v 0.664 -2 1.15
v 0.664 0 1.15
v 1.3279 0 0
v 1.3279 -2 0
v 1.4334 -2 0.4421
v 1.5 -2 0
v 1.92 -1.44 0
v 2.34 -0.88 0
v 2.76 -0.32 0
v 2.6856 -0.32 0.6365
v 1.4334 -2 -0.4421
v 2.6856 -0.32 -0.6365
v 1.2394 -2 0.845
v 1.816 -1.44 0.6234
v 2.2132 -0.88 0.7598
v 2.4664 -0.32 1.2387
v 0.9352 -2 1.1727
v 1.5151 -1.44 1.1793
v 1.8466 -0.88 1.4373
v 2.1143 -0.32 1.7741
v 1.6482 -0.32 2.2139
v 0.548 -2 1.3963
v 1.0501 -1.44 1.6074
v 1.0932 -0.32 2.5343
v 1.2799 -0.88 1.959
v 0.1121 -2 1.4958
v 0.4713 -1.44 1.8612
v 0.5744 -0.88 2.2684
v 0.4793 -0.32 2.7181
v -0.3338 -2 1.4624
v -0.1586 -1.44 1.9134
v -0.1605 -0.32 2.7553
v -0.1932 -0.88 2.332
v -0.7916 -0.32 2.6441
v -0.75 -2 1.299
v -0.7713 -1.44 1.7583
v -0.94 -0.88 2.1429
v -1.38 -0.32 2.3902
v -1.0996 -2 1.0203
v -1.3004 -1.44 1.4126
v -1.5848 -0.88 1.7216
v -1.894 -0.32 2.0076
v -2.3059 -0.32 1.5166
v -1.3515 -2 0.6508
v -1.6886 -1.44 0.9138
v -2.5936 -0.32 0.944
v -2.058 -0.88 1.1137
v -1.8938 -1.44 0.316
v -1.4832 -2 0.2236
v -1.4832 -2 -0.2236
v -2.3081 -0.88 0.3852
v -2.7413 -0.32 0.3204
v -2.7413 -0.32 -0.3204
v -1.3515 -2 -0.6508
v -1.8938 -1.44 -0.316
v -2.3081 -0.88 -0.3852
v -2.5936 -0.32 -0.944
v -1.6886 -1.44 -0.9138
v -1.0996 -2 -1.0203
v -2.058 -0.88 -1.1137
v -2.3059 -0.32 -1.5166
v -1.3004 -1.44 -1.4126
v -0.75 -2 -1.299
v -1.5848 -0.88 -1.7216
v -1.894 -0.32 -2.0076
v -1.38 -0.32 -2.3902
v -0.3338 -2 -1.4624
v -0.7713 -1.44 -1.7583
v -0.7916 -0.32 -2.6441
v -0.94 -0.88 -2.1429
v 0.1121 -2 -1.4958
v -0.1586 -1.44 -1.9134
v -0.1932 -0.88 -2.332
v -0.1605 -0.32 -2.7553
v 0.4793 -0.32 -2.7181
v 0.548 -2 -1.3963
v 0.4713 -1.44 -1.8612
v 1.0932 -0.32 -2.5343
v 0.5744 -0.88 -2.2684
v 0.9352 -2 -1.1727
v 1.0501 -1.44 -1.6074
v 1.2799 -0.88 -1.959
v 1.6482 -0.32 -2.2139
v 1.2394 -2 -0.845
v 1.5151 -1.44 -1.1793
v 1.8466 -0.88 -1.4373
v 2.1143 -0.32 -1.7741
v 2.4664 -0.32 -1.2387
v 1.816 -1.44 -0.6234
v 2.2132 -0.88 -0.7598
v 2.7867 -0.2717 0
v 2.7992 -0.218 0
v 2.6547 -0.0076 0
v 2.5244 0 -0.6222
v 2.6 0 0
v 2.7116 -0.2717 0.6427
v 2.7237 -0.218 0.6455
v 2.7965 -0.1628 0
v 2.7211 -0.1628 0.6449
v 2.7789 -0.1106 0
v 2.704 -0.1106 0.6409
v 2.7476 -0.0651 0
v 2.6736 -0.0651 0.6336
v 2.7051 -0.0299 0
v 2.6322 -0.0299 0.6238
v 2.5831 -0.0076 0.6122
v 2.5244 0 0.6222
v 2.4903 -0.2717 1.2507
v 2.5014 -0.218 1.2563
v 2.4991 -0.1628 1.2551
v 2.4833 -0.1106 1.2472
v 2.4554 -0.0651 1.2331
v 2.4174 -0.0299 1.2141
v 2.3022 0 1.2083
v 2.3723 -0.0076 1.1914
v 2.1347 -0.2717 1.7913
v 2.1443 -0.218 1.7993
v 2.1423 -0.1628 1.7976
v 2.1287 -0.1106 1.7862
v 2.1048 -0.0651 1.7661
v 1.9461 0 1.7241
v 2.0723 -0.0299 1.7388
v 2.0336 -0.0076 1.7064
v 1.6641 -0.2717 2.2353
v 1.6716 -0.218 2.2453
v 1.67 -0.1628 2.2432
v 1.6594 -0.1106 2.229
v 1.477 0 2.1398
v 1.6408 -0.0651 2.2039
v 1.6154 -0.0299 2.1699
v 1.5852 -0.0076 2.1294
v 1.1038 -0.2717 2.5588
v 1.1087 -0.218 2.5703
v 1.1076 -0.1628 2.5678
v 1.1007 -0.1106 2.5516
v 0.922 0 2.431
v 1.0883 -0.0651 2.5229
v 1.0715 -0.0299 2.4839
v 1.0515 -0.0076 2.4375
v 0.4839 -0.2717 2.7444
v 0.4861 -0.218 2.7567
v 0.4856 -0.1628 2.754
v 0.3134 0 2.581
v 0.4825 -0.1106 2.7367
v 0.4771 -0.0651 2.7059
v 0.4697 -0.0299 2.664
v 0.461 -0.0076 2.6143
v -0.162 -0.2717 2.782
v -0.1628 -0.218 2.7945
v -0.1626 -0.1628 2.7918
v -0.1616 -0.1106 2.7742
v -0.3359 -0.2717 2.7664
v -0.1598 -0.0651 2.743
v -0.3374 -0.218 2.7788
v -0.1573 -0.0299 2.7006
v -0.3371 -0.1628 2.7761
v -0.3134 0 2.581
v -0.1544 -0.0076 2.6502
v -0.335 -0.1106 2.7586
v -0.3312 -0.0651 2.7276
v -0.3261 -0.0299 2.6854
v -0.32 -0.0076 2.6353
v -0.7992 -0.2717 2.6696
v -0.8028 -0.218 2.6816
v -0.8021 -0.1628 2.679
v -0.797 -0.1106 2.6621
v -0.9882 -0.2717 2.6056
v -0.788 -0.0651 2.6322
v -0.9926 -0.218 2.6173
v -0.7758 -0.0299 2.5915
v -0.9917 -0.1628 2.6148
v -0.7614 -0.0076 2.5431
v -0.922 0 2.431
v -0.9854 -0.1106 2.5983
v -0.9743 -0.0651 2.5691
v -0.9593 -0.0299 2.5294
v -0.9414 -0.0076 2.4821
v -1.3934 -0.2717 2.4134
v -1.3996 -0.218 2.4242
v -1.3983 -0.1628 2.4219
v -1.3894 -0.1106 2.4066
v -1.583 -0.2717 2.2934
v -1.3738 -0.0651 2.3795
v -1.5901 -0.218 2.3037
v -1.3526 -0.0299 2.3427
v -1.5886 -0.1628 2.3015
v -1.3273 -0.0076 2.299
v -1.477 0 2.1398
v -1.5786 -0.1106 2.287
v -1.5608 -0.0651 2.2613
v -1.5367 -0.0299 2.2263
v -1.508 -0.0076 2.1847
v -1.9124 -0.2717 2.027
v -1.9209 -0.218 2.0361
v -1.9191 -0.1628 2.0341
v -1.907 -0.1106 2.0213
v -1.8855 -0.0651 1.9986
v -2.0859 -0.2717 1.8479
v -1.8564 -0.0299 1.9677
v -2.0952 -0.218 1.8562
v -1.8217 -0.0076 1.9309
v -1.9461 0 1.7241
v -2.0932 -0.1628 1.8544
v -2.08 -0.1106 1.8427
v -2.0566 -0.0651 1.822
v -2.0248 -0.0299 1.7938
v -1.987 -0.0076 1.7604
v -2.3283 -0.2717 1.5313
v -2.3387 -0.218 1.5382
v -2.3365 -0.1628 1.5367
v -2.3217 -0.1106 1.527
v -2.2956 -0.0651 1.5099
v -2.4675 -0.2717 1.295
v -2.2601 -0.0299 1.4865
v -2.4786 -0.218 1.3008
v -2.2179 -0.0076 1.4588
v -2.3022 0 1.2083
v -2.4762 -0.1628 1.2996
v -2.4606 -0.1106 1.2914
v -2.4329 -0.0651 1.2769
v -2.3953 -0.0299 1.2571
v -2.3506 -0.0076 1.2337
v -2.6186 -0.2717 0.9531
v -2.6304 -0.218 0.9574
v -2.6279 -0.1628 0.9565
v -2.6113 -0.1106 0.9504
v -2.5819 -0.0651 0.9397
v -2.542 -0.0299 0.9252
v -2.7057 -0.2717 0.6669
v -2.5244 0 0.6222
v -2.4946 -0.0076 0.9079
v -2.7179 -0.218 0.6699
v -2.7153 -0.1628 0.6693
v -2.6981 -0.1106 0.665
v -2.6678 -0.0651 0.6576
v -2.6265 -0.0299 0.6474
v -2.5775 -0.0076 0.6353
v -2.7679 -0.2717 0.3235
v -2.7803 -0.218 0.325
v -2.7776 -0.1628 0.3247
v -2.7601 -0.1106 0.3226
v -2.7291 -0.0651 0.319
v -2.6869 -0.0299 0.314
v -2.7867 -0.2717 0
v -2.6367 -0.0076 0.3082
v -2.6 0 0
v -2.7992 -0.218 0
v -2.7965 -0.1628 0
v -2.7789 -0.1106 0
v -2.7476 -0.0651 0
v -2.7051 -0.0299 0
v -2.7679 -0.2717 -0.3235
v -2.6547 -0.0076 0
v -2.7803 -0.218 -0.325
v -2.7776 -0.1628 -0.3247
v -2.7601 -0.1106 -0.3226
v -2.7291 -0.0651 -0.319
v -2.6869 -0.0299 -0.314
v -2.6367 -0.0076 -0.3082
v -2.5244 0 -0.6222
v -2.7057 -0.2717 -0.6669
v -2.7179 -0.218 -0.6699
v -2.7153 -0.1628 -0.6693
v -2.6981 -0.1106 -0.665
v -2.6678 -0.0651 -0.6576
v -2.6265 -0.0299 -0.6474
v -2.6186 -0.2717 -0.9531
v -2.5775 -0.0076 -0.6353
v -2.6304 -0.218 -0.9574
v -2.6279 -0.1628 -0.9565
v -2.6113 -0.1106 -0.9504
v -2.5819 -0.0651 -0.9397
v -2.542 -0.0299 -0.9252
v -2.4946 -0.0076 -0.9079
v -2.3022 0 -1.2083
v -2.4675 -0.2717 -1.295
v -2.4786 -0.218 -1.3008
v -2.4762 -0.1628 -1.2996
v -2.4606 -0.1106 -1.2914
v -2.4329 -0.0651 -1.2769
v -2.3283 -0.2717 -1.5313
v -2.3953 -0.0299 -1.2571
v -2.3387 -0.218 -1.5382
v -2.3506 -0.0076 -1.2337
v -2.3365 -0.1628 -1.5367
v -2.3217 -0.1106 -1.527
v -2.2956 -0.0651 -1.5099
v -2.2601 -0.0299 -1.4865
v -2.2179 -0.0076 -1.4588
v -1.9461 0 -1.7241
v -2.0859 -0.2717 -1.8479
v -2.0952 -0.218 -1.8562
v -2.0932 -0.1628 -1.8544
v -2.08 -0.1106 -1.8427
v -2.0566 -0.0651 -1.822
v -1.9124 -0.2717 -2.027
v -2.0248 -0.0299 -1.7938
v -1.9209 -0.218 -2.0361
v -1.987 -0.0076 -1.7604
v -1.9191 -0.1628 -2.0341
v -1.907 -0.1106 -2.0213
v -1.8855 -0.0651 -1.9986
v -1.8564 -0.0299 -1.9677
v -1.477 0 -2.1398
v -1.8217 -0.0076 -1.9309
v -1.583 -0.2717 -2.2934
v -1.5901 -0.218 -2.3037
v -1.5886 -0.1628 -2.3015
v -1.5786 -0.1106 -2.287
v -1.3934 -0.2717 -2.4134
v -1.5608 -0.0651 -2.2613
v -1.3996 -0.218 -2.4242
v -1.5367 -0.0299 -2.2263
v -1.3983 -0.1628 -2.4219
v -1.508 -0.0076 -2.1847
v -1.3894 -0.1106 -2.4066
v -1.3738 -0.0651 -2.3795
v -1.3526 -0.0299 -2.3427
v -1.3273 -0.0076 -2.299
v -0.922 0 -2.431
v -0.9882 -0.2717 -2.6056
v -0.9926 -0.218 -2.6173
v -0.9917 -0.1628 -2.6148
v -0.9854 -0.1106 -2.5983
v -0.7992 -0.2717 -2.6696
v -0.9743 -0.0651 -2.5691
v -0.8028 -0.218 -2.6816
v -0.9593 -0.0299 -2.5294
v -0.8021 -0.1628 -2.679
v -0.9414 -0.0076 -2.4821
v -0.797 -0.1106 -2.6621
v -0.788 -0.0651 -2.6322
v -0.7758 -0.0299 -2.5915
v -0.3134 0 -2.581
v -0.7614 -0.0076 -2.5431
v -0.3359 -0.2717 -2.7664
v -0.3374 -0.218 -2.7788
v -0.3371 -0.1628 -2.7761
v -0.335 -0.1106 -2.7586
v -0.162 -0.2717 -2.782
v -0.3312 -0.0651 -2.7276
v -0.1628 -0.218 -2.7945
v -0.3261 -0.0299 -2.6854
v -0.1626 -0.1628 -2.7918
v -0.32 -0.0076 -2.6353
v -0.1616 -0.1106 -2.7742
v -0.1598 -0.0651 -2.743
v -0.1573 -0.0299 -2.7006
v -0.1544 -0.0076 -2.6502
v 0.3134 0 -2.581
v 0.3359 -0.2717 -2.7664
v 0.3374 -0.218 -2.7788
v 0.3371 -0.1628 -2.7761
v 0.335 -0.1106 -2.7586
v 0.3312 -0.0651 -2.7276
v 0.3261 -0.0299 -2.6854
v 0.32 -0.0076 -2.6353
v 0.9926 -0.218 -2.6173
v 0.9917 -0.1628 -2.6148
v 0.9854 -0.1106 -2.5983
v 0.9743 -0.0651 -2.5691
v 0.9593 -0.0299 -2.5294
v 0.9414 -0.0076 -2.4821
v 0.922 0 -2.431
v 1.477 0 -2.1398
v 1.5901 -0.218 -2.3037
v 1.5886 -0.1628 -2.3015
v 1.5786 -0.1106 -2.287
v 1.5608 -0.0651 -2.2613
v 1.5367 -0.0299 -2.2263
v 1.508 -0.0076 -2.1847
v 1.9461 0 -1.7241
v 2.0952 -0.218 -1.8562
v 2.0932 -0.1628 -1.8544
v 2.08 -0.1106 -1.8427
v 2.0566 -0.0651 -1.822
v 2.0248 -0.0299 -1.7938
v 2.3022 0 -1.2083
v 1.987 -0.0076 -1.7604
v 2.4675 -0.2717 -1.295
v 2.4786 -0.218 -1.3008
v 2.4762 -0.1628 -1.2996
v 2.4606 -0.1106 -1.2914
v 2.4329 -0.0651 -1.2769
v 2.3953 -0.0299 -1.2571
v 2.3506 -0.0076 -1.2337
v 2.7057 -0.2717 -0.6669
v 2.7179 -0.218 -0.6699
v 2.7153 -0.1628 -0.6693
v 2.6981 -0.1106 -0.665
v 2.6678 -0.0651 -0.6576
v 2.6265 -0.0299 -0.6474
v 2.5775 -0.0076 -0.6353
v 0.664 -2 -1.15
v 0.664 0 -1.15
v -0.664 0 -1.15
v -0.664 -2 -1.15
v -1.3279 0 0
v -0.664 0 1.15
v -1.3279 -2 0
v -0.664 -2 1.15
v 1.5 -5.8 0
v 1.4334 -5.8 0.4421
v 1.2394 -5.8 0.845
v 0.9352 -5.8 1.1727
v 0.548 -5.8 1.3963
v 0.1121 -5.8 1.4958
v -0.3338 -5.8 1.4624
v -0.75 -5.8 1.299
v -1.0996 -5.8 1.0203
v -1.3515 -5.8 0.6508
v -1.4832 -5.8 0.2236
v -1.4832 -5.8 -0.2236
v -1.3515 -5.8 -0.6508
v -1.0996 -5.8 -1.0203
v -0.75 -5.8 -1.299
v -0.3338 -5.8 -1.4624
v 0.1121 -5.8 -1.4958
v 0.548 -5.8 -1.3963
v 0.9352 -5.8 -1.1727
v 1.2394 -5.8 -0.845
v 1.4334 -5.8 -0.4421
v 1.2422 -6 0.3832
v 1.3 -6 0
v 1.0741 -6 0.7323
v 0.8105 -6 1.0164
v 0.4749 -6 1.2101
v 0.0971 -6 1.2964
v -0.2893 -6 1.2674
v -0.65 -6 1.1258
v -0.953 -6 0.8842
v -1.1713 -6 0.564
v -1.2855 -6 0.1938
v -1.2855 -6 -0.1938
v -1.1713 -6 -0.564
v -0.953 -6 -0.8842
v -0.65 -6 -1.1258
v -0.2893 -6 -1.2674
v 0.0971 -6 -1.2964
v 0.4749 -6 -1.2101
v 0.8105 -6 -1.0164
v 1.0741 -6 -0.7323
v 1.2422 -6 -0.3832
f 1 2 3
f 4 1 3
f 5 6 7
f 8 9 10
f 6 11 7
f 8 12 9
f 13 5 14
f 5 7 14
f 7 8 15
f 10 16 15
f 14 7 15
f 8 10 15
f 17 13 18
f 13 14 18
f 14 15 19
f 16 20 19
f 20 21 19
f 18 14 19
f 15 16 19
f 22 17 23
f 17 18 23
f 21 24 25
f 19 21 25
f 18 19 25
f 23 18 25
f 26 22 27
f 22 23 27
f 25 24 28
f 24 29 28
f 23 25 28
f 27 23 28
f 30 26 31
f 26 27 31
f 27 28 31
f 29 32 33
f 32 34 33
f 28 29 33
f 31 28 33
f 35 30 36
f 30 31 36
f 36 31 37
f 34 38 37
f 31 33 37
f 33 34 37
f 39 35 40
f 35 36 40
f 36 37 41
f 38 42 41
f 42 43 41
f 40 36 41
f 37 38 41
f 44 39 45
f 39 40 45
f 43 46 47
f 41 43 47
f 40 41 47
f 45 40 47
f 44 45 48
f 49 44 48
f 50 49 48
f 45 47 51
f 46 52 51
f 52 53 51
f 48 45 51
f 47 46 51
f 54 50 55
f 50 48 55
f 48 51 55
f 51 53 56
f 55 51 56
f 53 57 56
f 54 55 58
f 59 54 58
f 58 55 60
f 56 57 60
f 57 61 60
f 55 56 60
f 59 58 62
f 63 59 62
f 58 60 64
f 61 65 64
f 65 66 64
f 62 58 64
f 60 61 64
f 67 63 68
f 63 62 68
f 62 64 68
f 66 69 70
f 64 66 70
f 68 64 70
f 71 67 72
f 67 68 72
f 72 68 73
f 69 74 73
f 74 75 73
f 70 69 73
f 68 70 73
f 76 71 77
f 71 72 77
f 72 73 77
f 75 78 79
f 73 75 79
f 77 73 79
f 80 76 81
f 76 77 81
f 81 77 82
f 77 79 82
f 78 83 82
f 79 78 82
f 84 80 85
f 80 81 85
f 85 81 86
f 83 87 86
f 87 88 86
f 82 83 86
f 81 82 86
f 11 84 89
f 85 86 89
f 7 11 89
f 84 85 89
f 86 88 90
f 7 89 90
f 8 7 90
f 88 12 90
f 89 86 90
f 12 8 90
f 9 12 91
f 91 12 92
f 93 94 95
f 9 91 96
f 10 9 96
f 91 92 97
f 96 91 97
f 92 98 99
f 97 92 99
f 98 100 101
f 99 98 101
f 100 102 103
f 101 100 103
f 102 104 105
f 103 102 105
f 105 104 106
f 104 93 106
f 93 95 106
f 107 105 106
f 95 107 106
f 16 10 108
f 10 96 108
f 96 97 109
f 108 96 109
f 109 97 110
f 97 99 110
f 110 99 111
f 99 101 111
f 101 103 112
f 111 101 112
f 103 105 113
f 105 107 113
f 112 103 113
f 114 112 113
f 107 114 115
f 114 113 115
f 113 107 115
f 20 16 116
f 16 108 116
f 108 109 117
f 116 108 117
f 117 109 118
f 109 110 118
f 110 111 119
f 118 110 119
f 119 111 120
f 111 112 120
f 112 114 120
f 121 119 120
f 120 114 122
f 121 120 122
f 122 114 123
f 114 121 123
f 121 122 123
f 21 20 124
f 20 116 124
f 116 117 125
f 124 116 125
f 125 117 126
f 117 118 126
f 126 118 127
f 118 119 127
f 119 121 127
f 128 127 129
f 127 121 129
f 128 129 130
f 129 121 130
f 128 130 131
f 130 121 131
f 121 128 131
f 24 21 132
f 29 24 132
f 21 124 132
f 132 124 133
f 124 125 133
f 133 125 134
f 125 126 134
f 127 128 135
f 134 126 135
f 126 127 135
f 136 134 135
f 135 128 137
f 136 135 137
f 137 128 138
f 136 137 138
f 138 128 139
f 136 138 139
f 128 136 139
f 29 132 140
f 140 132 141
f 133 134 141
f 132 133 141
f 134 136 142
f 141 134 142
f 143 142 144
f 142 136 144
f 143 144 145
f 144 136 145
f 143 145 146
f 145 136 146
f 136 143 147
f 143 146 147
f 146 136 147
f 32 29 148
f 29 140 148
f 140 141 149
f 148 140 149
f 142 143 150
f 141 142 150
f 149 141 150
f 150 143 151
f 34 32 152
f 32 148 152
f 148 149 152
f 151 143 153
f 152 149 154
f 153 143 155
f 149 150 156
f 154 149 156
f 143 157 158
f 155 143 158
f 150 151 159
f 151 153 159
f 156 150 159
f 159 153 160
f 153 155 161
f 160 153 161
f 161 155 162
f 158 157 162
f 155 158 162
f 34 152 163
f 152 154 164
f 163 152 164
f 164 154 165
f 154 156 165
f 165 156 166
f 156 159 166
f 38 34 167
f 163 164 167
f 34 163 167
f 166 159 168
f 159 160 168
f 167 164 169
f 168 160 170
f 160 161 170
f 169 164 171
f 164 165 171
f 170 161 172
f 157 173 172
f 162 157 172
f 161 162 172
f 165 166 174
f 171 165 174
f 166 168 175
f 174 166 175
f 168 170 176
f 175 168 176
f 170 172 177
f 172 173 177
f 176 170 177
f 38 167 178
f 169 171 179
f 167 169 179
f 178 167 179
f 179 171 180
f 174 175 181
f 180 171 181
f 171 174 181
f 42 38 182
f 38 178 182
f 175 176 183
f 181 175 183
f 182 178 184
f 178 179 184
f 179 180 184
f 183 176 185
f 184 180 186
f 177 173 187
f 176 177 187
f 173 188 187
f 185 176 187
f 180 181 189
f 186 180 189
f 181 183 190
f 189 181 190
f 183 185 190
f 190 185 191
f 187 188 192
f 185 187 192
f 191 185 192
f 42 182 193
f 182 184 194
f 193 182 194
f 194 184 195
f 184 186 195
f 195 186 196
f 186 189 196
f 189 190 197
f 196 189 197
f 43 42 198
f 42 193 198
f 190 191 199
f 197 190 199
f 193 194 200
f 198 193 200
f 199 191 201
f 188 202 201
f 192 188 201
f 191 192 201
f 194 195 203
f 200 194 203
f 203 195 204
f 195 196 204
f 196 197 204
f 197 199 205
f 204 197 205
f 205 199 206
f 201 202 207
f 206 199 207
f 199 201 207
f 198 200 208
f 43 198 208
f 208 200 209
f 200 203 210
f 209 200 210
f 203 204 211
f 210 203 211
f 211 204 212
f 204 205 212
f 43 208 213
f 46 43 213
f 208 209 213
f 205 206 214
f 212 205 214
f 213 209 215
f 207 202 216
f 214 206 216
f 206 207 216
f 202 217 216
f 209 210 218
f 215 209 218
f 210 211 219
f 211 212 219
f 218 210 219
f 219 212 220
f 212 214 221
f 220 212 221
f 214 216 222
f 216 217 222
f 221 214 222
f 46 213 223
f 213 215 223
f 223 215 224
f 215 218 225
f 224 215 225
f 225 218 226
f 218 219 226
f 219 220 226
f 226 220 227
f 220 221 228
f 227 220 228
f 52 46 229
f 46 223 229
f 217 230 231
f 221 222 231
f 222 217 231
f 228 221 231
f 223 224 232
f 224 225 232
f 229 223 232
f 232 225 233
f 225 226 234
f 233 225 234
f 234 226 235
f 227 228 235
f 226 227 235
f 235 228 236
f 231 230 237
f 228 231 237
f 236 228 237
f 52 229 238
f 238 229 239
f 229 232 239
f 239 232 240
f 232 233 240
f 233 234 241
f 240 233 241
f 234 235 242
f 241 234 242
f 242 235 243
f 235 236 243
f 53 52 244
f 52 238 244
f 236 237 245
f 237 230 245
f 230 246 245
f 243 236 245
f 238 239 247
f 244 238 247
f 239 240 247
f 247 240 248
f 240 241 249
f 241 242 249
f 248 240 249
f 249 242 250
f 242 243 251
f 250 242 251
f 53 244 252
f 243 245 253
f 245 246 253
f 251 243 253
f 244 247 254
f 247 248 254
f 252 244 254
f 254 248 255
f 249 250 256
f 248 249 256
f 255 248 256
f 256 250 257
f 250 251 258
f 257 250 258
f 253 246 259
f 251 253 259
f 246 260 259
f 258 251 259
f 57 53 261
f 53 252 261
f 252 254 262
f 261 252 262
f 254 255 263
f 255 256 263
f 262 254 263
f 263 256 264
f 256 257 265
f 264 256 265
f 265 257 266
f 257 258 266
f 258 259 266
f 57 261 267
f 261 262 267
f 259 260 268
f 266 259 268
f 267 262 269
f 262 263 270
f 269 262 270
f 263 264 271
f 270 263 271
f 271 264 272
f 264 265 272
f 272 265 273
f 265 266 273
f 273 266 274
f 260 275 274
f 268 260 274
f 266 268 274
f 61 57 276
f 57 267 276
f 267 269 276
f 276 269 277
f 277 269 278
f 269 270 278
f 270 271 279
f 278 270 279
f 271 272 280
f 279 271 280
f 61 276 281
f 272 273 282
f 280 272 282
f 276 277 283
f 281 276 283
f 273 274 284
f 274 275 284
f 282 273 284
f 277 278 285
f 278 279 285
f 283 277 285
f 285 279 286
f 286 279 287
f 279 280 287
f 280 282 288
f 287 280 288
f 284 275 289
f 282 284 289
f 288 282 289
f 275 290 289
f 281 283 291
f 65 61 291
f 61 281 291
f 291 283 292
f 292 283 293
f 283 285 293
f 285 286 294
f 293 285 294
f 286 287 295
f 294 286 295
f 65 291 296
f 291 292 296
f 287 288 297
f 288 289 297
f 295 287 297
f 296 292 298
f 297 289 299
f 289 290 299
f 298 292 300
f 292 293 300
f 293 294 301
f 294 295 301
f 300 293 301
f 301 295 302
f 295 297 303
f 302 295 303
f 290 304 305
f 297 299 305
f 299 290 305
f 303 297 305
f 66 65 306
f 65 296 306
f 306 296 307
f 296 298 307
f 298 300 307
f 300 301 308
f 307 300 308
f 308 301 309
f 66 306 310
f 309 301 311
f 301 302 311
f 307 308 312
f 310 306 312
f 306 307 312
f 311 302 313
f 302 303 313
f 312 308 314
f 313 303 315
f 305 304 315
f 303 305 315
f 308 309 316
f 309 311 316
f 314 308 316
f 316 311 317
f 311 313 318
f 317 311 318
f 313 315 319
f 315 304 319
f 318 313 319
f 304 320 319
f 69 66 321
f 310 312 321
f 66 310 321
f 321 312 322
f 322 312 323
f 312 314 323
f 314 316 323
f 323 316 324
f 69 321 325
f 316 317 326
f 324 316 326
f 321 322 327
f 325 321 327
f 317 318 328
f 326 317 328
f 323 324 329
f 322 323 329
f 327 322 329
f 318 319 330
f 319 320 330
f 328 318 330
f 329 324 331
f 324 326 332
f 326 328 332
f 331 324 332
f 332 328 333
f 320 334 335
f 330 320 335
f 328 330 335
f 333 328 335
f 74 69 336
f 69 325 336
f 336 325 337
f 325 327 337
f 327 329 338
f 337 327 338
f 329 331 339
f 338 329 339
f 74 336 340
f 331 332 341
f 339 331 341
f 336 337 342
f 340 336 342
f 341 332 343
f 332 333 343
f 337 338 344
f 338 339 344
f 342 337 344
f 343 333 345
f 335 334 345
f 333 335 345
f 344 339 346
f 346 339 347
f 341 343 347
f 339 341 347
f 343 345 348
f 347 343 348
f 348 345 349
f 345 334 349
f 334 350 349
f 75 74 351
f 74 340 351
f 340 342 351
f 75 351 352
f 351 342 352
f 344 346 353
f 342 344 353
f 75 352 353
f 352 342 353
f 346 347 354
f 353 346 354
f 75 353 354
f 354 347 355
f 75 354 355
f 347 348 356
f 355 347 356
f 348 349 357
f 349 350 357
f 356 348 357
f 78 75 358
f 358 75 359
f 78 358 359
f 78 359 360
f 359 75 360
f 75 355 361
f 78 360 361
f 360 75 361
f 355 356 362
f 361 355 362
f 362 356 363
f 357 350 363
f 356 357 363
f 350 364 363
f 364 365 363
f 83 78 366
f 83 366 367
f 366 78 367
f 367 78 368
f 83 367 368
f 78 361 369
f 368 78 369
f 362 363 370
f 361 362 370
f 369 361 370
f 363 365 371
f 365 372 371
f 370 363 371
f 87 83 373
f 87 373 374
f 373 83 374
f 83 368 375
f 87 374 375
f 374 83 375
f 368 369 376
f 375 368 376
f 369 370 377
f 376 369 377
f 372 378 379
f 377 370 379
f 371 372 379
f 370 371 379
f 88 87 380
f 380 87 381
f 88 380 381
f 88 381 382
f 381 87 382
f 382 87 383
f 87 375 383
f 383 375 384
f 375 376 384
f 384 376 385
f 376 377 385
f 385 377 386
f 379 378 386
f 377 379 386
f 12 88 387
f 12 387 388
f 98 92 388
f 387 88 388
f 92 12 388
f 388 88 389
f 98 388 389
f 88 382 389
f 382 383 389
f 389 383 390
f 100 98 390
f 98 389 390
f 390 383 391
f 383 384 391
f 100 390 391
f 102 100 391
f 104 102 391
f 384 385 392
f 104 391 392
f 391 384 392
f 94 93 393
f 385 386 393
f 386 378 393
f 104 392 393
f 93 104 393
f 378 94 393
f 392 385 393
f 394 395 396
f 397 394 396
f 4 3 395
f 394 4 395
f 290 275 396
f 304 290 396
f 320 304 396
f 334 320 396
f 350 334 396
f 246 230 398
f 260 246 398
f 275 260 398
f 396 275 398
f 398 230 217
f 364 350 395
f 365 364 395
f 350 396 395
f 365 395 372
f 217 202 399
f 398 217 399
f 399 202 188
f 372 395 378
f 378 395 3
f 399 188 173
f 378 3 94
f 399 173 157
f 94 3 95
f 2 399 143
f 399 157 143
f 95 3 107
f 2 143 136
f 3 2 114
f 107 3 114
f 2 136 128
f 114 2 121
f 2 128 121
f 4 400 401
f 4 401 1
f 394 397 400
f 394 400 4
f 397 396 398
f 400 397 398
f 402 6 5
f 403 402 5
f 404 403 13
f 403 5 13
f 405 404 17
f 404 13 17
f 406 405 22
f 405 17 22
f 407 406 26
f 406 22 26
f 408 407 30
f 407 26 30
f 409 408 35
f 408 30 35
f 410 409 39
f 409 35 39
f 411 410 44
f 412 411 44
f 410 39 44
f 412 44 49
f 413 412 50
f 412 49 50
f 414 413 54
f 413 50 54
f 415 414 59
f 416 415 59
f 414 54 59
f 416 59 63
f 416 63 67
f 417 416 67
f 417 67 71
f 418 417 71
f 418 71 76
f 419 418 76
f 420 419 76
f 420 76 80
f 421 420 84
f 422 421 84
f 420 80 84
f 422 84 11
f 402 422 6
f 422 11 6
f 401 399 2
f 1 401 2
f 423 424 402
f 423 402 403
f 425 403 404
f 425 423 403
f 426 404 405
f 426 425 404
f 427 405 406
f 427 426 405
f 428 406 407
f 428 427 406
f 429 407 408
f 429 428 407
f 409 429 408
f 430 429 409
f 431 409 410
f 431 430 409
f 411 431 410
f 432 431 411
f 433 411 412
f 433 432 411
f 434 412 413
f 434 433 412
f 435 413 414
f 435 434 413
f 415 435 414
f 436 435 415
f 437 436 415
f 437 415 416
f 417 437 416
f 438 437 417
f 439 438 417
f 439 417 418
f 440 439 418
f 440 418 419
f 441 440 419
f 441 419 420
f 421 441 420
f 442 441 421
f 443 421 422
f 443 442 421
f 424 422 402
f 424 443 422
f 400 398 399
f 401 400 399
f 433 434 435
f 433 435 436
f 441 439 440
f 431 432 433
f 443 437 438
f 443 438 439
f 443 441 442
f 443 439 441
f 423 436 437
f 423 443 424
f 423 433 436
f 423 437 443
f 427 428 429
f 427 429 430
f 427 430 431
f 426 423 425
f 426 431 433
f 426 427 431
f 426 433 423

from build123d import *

# Parameters (mm, degrees)
SKETCH_2_R          = 1.5
EXTRUDE_1_DEPTH     = 4
CUT_EXTRUDE_1_DEPTH = 2
CHAMFER_1_SIZE      = 0.2
FILLET_1_R          = 0.2


with BuildPart() as part:
    # 草图1 → 旋转1 (revolve)
    with BuildSketch(Plane.XY):
        Polygon((0, 0), (0, -2), (1.5, -2), (3, 0), align=None)
    revolve(axis=Axis((0, 0, 0), (0, -1, 0)))

    # 草图2 → 凸台-拉伸1 (add)
    with BuildSketch(Plane.XZ.offset(2)):
        Circle(SKETCH_2_R)
    extrude(amount=EXTRUDE_1_DEPTH)

    # 草图3 → 切除-拉伸1 (cut)
    with BuildSketch(Plane(origin=(0, 0, 0), x_dir=(1, 0, 0), z_dir=(0, 1, 0))):
        Polygon((-1.327905619, 0), (-0.66395281, -1.15), (0.66395281, -1.15), (1.327905619, 0), (0.66395281, 1.15), (-0.66395281, 1.15), align=None)
    extrude(amount=-CUT_EXTRUDE_1_DEPTH, mode=Mode.SUBTRACT)

    # 倒角1
    chamfer_1_edges = [part.edges().sort_by_distance(p)[0] for p in [
        (-1.5, -6, 0),
    ]]
    chamfer(chamfer_1_edges, length=CHAMFER_1_SIZE)

    # 圆角1
    fillet_1_edges = [part.edges().sort_by_distance(p)[0] for p in [
        (-3, 0, 0),
    ]]
    fillet(fillet_1_edges, radius=FILLET_1_R)


solid = part.part
